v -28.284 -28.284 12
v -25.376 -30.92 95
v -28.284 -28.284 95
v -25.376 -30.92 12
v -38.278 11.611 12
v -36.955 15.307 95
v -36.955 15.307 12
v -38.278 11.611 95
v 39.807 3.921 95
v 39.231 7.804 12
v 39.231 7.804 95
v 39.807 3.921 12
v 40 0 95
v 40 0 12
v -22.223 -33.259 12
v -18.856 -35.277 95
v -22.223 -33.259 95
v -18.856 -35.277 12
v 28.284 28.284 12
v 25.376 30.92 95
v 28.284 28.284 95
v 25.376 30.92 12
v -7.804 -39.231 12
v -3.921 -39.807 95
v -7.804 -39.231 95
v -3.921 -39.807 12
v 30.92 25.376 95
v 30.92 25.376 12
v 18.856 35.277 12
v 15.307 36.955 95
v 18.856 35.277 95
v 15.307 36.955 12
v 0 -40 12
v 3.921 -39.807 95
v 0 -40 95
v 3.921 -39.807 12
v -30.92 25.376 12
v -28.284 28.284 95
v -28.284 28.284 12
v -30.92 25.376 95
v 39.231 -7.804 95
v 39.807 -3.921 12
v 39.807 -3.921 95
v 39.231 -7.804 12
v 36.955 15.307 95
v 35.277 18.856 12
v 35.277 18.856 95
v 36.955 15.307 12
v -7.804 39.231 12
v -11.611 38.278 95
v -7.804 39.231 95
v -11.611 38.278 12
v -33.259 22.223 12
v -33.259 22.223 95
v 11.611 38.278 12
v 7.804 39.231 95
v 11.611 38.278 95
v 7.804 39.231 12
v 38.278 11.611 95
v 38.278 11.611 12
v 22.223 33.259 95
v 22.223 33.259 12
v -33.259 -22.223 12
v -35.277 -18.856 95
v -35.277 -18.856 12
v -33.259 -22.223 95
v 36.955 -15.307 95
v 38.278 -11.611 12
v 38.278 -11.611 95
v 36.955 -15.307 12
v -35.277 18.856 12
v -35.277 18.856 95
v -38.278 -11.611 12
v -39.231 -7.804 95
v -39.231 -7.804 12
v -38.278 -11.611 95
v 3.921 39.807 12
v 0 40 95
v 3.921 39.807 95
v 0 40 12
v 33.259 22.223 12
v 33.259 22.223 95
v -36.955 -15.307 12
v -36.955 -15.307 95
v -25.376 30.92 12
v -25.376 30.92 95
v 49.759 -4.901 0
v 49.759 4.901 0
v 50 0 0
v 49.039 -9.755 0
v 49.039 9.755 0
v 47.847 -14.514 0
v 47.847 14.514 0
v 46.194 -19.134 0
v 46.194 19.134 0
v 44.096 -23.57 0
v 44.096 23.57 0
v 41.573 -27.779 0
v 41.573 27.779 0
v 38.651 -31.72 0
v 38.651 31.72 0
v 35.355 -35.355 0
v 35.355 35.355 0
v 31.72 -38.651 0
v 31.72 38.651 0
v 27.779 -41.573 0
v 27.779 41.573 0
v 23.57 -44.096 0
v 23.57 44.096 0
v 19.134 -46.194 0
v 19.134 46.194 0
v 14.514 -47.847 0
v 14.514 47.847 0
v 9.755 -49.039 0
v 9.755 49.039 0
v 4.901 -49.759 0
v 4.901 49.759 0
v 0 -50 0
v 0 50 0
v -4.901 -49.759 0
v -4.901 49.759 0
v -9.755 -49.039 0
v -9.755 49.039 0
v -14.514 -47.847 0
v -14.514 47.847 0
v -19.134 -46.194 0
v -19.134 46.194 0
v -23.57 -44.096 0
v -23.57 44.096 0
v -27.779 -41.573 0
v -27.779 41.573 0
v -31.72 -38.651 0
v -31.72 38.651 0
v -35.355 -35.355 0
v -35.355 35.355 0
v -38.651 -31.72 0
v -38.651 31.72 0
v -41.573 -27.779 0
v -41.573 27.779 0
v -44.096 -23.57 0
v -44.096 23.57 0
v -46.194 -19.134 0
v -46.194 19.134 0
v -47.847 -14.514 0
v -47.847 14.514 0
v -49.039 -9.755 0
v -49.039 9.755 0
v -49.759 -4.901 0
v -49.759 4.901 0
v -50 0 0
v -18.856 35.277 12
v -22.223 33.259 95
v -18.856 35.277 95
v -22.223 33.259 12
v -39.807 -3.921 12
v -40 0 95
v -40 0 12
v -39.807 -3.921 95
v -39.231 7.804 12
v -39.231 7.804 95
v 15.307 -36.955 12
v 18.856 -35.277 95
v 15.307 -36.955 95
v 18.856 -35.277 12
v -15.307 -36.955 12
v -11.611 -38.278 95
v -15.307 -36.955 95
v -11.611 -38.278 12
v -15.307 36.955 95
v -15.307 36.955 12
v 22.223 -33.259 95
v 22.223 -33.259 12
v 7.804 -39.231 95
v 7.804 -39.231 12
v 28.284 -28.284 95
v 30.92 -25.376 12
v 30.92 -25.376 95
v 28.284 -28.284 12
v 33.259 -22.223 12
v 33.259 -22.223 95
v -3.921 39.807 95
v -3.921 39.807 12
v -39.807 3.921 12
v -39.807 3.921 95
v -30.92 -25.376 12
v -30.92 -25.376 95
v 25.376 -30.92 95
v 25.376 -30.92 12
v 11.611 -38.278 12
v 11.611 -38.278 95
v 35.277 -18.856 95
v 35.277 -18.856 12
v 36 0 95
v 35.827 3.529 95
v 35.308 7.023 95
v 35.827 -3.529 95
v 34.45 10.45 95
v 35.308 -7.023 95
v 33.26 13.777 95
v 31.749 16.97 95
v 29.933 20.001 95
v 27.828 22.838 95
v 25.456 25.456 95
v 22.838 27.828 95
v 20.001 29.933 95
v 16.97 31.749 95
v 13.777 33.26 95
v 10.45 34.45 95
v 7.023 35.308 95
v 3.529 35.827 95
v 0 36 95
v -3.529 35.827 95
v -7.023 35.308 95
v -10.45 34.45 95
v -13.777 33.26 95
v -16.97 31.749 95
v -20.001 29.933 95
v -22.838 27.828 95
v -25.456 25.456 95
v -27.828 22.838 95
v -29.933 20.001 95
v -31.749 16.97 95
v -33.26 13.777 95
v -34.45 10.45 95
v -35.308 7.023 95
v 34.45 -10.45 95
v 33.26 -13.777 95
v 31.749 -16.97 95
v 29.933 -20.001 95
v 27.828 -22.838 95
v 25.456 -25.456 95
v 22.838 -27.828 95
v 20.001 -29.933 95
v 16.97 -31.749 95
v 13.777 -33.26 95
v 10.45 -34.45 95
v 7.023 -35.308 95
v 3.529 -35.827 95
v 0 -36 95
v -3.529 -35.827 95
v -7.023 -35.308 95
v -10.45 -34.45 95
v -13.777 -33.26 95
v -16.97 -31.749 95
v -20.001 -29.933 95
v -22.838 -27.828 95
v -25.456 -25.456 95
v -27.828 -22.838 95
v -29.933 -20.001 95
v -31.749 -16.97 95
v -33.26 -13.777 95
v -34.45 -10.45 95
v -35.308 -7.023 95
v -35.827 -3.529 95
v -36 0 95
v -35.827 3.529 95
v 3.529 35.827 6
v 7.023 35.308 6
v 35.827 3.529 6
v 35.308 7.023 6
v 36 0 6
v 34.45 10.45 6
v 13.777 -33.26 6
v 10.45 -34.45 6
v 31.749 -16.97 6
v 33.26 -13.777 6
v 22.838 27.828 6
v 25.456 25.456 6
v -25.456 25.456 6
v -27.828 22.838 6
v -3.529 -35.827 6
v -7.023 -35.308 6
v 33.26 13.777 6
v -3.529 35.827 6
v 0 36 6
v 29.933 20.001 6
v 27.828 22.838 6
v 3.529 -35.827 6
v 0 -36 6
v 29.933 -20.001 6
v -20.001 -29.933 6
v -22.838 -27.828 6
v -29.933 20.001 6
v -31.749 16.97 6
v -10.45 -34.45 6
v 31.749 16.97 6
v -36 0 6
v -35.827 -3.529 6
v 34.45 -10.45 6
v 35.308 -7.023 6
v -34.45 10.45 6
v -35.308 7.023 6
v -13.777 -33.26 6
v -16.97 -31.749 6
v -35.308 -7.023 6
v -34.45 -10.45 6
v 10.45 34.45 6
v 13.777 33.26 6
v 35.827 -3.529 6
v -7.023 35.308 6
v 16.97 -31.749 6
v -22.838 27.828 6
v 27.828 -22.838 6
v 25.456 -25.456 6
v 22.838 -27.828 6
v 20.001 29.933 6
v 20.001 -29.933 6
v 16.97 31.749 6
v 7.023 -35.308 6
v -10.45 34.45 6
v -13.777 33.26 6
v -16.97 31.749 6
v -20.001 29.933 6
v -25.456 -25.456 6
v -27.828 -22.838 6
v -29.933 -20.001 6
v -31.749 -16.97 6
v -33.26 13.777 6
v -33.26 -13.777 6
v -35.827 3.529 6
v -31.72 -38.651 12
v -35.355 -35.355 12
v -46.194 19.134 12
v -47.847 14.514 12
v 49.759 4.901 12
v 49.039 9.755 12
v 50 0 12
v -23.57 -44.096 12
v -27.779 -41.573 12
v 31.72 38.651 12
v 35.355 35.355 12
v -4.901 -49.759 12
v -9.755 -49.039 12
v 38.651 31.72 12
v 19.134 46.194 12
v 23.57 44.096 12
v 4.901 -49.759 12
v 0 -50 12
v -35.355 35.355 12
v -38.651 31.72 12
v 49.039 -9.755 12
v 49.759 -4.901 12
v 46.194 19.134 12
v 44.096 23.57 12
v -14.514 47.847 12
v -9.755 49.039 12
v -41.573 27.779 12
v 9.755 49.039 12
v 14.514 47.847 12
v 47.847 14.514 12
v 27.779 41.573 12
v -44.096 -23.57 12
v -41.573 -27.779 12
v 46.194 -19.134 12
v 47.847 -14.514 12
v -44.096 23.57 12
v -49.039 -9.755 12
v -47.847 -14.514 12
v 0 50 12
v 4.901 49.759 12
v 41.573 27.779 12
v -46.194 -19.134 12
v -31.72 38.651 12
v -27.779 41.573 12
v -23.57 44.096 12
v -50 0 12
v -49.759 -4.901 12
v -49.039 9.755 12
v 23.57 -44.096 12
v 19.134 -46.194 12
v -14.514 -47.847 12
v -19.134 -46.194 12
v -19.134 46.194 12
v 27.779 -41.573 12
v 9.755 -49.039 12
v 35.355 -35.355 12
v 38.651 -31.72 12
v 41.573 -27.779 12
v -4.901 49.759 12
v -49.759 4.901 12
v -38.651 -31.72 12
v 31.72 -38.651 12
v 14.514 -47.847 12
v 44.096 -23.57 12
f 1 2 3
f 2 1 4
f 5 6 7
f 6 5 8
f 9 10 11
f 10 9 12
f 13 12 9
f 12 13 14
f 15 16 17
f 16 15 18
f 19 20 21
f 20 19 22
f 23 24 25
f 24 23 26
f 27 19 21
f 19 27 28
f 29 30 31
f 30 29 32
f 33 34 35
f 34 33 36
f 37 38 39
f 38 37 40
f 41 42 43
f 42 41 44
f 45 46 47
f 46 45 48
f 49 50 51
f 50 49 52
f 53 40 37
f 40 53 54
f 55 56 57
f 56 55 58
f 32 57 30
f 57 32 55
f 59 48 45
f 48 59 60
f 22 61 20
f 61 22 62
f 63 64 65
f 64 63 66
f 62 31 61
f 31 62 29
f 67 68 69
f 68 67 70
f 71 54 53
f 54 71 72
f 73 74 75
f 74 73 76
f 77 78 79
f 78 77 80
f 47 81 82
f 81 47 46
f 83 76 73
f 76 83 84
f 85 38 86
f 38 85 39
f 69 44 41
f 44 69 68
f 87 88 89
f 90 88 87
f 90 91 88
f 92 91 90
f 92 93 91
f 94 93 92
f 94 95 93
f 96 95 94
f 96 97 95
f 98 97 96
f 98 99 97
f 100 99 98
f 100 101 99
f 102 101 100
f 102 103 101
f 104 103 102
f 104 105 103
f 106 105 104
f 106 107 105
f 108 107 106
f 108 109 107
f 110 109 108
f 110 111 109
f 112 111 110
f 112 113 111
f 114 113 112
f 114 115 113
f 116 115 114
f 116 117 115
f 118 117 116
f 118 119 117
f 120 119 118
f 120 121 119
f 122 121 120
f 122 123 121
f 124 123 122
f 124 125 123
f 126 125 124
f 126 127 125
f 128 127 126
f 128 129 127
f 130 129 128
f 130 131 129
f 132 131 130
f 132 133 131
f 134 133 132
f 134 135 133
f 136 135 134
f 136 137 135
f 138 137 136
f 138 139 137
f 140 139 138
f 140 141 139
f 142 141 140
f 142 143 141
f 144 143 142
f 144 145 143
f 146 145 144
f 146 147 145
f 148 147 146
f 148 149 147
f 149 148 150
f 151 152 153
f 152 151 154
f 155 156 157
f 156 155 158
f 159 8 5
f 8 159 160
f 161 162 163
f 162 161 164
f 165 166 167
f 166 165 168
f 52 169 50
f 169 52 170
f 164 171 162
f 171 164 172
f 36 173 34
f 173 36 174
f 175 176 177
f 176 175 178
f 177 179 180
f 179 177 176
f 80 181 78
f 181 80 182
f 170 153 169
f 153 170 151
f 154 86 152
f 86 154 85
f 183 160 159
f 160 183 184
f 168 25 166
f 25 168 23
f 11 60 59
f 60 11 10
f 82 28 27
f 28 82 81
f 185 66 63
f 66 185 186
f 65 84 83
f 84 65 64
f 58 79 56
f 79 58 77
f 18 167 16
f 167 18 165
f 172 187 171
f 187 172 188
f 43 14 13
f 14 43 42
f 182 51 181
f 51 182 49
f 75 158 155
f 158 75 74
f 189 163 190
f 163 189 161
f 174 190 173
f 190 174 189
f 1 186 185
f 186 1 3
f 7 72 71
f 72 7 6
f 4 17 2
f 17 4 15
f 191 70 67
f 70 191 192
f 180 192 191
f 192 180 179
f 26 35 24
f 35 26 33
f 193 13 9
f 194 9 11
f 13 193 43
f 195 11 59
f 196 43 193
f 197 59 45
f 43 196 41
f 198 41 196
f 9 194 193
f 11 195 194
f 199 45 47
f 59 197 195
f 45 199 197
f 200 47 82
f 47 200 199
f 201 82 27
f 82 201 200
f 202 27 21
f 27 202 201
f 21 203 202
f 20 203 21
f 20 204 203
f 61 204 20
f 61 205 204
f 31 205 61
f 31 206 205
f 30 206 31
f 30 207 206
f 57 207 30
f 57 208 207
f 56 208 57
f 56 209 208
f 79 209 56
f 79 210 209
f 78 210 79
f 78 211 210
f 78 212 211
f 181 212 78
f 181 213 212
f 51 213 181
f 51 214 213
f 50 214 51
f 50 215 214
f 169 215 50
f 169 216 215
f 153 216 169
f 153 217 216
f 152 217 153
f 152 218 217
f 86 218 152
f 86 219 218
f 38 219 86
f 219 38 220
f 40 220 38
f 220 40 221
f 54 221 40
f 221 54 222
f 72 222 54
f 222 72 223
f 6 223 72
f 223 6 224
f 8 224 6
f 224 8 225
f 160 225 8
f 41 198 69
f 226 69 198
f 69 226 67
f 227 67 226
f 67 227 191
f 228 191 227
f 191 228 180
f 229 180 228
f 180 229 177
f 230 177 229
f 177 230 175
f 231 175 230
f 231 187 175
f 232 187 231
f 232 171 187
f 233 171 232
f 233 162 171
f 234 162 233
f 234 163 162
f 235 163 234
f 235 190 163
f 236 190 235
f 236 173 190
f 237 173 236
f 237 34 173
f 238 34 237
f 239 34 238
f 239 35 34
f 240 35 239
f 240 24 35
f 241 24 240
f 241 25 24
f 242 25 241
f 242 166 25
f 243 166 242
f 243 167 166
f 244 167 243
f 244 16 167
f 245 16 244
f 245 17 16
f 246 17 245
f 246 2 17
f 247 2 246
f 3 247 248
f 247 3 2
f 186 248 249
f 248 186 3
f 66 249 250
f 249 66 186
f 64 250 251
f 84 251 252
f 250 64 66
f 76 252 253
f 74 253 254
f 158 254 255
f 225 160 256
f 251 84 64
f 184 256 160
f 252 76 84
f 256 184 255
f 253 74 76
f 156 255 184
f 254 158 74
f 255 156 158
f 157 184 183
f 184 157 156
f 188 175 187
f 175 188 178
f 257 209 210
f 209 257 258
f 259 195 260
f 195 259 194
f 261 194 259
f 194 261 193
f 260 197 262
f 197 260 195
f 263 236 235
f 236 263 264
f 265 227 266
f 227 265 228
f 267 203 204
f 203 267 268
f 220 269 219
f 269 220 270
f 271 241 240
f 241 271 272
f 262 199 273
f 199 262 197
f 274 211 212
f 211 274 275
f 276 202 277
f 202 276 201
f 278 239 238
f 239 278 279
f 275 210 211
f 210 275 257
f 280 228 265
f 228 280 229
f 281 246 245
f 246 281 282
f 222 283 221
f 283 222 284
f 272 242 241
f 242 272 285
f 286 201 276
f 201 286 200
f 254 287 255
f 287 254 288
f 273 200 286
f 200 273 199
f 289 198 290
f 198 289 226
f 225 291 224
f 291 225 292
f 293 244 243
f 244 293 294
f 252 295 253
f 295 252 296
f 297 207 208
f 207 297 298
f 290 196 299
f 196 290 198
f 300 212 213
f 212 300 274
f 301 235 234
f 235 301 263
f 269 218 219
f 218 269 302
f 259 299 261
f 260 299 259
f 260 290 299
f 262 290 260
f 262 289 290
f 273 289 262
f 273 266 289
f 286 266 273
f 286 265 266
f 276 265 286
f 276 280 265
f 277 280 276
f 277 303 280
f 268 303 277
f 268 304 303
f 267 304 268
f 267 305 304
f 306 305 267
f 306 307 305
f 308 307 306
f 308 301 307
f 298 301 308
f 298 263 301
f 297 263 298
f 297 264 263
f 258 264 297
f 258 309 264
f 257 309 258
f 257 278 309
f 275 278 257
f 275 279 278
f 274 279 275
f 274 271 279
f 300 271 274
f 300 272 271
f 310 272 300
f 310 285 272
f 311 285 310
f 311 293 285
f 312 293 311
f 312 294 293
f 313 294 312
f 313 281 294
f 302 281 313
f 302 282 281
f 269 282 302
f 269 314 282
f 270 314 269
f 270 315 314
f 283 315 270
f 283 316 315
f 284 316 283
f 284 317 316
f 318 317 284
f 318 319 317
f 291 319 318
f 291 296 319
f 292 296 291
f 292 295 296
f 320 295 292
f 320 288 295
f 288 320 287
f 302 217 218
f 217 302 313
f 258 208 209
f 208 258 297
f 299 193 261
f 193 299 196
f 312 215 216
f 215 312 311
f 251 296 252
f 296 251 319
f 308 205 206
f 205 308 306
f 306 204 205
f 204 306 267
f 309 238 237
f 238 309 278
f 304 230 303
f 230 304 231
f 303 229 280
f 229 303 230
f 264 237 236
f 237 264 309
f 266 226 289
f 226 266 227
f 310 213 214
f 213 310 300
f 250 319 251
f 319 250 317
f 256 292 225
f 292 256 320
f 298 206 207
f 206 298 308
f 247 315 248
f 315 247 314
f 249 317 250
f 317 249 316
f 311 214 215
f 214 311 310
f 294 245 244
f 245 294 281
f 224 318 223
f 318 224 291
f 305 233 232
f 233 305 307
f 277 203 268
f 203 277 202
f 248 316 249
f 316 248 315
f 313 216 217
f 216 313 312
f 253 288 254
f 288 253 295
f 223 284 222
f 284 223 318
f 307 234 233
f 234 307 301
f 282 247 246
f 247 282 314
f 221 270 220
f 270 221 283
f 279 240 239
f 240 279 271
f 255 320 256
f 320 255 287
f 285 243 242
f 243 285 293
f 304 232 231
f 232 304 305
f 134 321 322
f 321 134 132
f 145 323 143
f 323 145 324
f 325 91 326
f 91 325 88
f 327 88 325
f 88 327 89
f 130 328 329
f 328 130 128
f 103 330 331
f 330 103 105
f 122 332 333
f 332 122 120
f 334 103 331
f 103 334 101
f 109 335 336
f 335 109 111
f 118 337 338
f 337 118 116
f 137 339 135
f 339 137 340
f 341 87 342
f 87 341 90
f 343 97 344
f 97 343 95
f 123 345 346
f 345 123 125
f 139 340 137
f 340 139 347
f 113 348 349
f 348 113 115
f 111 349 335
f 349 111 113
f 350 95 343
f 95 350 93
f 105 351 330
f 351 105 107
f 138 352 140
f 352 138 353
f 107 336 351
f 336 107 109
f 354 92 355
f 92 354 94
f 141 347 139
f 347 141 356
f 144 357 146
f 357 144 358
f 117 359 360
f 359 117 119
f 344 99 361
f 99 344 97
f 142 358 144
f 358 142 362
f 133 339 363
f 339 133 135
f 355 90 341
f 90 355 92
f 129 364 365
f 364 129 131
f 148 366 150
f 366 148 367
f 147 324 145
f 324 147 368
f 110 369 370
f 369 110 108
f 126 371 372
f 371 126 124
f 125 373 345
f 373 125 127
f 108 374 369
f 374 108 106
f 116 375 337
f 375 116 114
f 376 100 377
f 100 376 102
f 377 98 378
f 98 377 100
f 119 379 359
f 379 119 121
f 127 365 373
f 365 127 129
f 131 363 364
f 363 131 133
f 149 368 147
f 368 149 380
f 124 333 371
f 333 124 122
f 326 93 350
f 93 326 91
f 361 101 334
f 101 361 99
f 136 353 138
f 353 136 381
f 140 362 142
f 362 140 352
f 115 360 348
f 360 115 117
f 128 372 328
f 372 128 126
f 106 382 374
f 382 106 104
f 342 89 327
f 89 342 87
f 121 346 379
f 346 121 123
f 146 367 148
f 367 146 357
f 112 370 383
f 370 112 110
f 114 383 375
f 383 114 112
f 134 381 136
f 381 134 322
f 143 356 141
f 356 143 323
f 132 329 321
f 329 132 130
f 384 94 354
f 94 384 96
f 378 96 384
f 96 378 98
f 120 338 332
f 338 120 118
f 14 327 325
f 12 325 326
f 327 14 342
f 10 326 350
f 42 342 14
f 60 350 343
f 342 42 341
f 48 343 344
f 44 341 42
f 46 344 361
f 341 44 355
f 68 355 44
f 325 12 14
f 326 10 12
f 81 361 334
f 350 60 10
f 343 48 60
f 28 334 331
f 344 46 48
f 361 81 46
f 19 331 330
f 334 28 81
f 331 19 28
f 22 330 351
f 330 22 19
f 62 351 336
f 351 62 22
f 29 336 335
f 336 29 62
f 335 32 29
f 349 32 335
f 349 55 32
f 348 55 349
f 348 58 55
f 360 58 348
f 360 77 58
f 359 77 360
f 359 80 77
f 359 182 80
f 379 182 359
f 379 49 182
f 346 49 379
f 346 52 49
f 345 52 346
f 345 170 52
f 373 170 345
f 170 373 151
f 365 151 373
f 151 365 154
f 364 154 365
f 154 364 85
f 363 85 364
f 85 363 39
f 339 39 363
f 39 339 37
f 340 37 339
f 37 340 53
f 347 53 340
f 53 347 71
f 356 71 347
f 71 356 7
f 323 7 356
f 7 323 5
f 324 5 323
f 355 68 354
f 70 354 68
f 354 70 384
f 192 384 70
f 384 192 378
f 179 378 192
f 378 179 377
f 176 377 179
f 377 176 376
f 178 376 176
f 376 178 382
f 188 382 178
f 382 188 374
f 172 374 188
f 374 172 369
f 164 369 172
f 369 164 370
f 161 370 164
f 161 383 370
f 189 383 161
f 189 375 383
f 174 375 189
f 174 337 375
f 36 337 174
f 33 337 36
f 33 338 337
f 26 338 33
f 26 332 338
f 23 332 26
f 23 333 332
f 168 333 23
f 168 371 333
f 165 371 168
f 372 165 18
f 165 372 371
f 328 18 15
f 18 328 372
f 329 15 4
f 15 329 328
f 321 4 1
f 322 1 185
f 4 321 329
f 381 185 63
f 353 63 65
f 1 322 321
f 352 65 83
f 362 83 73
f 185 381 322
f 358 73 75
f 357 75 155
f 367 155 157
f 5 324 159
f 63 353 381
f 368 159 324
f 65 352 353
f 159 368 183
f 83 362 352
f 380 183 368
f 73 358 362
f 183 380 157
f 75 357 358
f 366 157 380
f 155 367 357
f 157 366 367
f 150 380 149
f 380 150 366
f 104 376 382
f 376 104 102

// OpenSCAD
// Deterministic "visual-only defect" fixture for spike 3.
//
// This is a coffee mug whose loop handle is fused to the UNDERSIDE of the base
// instead of the side wall. It is a single, watertight, manifold solid with one
// connected component, so `validate_mesh` reports it as completely clean.
// The defect is visible ONLY in the rendered image — which is exactly what the
// image tool-result path has to be good for.

/* [Cup] */
cup_outer_d   = 80;   // [40:120]
cup_height    = 95;   // [40:160]
wall          = 4;    // [2:8]
base          = 6;    // [3:12]

/* [Handle] */
handle_loop_r = 44;   // [15:70]
handle_bar_d  = 12;   // [5:20]
handle_embed  = 0;    // [0:8]

/* [Quality] */
$fn = 64;             // [16:8:128]

module cup() {
    difference() {
        cylinder(h = cup_height, d = cup_outer_d);
        translate([0, 0, base])
            cylinder(h = cup_height, d = cup_outer_d - 2 * wall);
    }
}

module handle() {
    difference() {
        cylinder(h = handle_bar_d, r = handle_loop_r + handle_bar_d / 2);
        translate([0, 0, -1])
            cylinder(h = handle_bar_d + 2, r = handle_loop_r - handle_bar_d / 2);
    }
}

union() {
    cup();
    // DEFECT: the handle loop lies flat around the bottom of the cup like a
    // skirt, instead of standing vertically against the side wall.
    translate([0, 0, handle_embed])
        handle();
}
